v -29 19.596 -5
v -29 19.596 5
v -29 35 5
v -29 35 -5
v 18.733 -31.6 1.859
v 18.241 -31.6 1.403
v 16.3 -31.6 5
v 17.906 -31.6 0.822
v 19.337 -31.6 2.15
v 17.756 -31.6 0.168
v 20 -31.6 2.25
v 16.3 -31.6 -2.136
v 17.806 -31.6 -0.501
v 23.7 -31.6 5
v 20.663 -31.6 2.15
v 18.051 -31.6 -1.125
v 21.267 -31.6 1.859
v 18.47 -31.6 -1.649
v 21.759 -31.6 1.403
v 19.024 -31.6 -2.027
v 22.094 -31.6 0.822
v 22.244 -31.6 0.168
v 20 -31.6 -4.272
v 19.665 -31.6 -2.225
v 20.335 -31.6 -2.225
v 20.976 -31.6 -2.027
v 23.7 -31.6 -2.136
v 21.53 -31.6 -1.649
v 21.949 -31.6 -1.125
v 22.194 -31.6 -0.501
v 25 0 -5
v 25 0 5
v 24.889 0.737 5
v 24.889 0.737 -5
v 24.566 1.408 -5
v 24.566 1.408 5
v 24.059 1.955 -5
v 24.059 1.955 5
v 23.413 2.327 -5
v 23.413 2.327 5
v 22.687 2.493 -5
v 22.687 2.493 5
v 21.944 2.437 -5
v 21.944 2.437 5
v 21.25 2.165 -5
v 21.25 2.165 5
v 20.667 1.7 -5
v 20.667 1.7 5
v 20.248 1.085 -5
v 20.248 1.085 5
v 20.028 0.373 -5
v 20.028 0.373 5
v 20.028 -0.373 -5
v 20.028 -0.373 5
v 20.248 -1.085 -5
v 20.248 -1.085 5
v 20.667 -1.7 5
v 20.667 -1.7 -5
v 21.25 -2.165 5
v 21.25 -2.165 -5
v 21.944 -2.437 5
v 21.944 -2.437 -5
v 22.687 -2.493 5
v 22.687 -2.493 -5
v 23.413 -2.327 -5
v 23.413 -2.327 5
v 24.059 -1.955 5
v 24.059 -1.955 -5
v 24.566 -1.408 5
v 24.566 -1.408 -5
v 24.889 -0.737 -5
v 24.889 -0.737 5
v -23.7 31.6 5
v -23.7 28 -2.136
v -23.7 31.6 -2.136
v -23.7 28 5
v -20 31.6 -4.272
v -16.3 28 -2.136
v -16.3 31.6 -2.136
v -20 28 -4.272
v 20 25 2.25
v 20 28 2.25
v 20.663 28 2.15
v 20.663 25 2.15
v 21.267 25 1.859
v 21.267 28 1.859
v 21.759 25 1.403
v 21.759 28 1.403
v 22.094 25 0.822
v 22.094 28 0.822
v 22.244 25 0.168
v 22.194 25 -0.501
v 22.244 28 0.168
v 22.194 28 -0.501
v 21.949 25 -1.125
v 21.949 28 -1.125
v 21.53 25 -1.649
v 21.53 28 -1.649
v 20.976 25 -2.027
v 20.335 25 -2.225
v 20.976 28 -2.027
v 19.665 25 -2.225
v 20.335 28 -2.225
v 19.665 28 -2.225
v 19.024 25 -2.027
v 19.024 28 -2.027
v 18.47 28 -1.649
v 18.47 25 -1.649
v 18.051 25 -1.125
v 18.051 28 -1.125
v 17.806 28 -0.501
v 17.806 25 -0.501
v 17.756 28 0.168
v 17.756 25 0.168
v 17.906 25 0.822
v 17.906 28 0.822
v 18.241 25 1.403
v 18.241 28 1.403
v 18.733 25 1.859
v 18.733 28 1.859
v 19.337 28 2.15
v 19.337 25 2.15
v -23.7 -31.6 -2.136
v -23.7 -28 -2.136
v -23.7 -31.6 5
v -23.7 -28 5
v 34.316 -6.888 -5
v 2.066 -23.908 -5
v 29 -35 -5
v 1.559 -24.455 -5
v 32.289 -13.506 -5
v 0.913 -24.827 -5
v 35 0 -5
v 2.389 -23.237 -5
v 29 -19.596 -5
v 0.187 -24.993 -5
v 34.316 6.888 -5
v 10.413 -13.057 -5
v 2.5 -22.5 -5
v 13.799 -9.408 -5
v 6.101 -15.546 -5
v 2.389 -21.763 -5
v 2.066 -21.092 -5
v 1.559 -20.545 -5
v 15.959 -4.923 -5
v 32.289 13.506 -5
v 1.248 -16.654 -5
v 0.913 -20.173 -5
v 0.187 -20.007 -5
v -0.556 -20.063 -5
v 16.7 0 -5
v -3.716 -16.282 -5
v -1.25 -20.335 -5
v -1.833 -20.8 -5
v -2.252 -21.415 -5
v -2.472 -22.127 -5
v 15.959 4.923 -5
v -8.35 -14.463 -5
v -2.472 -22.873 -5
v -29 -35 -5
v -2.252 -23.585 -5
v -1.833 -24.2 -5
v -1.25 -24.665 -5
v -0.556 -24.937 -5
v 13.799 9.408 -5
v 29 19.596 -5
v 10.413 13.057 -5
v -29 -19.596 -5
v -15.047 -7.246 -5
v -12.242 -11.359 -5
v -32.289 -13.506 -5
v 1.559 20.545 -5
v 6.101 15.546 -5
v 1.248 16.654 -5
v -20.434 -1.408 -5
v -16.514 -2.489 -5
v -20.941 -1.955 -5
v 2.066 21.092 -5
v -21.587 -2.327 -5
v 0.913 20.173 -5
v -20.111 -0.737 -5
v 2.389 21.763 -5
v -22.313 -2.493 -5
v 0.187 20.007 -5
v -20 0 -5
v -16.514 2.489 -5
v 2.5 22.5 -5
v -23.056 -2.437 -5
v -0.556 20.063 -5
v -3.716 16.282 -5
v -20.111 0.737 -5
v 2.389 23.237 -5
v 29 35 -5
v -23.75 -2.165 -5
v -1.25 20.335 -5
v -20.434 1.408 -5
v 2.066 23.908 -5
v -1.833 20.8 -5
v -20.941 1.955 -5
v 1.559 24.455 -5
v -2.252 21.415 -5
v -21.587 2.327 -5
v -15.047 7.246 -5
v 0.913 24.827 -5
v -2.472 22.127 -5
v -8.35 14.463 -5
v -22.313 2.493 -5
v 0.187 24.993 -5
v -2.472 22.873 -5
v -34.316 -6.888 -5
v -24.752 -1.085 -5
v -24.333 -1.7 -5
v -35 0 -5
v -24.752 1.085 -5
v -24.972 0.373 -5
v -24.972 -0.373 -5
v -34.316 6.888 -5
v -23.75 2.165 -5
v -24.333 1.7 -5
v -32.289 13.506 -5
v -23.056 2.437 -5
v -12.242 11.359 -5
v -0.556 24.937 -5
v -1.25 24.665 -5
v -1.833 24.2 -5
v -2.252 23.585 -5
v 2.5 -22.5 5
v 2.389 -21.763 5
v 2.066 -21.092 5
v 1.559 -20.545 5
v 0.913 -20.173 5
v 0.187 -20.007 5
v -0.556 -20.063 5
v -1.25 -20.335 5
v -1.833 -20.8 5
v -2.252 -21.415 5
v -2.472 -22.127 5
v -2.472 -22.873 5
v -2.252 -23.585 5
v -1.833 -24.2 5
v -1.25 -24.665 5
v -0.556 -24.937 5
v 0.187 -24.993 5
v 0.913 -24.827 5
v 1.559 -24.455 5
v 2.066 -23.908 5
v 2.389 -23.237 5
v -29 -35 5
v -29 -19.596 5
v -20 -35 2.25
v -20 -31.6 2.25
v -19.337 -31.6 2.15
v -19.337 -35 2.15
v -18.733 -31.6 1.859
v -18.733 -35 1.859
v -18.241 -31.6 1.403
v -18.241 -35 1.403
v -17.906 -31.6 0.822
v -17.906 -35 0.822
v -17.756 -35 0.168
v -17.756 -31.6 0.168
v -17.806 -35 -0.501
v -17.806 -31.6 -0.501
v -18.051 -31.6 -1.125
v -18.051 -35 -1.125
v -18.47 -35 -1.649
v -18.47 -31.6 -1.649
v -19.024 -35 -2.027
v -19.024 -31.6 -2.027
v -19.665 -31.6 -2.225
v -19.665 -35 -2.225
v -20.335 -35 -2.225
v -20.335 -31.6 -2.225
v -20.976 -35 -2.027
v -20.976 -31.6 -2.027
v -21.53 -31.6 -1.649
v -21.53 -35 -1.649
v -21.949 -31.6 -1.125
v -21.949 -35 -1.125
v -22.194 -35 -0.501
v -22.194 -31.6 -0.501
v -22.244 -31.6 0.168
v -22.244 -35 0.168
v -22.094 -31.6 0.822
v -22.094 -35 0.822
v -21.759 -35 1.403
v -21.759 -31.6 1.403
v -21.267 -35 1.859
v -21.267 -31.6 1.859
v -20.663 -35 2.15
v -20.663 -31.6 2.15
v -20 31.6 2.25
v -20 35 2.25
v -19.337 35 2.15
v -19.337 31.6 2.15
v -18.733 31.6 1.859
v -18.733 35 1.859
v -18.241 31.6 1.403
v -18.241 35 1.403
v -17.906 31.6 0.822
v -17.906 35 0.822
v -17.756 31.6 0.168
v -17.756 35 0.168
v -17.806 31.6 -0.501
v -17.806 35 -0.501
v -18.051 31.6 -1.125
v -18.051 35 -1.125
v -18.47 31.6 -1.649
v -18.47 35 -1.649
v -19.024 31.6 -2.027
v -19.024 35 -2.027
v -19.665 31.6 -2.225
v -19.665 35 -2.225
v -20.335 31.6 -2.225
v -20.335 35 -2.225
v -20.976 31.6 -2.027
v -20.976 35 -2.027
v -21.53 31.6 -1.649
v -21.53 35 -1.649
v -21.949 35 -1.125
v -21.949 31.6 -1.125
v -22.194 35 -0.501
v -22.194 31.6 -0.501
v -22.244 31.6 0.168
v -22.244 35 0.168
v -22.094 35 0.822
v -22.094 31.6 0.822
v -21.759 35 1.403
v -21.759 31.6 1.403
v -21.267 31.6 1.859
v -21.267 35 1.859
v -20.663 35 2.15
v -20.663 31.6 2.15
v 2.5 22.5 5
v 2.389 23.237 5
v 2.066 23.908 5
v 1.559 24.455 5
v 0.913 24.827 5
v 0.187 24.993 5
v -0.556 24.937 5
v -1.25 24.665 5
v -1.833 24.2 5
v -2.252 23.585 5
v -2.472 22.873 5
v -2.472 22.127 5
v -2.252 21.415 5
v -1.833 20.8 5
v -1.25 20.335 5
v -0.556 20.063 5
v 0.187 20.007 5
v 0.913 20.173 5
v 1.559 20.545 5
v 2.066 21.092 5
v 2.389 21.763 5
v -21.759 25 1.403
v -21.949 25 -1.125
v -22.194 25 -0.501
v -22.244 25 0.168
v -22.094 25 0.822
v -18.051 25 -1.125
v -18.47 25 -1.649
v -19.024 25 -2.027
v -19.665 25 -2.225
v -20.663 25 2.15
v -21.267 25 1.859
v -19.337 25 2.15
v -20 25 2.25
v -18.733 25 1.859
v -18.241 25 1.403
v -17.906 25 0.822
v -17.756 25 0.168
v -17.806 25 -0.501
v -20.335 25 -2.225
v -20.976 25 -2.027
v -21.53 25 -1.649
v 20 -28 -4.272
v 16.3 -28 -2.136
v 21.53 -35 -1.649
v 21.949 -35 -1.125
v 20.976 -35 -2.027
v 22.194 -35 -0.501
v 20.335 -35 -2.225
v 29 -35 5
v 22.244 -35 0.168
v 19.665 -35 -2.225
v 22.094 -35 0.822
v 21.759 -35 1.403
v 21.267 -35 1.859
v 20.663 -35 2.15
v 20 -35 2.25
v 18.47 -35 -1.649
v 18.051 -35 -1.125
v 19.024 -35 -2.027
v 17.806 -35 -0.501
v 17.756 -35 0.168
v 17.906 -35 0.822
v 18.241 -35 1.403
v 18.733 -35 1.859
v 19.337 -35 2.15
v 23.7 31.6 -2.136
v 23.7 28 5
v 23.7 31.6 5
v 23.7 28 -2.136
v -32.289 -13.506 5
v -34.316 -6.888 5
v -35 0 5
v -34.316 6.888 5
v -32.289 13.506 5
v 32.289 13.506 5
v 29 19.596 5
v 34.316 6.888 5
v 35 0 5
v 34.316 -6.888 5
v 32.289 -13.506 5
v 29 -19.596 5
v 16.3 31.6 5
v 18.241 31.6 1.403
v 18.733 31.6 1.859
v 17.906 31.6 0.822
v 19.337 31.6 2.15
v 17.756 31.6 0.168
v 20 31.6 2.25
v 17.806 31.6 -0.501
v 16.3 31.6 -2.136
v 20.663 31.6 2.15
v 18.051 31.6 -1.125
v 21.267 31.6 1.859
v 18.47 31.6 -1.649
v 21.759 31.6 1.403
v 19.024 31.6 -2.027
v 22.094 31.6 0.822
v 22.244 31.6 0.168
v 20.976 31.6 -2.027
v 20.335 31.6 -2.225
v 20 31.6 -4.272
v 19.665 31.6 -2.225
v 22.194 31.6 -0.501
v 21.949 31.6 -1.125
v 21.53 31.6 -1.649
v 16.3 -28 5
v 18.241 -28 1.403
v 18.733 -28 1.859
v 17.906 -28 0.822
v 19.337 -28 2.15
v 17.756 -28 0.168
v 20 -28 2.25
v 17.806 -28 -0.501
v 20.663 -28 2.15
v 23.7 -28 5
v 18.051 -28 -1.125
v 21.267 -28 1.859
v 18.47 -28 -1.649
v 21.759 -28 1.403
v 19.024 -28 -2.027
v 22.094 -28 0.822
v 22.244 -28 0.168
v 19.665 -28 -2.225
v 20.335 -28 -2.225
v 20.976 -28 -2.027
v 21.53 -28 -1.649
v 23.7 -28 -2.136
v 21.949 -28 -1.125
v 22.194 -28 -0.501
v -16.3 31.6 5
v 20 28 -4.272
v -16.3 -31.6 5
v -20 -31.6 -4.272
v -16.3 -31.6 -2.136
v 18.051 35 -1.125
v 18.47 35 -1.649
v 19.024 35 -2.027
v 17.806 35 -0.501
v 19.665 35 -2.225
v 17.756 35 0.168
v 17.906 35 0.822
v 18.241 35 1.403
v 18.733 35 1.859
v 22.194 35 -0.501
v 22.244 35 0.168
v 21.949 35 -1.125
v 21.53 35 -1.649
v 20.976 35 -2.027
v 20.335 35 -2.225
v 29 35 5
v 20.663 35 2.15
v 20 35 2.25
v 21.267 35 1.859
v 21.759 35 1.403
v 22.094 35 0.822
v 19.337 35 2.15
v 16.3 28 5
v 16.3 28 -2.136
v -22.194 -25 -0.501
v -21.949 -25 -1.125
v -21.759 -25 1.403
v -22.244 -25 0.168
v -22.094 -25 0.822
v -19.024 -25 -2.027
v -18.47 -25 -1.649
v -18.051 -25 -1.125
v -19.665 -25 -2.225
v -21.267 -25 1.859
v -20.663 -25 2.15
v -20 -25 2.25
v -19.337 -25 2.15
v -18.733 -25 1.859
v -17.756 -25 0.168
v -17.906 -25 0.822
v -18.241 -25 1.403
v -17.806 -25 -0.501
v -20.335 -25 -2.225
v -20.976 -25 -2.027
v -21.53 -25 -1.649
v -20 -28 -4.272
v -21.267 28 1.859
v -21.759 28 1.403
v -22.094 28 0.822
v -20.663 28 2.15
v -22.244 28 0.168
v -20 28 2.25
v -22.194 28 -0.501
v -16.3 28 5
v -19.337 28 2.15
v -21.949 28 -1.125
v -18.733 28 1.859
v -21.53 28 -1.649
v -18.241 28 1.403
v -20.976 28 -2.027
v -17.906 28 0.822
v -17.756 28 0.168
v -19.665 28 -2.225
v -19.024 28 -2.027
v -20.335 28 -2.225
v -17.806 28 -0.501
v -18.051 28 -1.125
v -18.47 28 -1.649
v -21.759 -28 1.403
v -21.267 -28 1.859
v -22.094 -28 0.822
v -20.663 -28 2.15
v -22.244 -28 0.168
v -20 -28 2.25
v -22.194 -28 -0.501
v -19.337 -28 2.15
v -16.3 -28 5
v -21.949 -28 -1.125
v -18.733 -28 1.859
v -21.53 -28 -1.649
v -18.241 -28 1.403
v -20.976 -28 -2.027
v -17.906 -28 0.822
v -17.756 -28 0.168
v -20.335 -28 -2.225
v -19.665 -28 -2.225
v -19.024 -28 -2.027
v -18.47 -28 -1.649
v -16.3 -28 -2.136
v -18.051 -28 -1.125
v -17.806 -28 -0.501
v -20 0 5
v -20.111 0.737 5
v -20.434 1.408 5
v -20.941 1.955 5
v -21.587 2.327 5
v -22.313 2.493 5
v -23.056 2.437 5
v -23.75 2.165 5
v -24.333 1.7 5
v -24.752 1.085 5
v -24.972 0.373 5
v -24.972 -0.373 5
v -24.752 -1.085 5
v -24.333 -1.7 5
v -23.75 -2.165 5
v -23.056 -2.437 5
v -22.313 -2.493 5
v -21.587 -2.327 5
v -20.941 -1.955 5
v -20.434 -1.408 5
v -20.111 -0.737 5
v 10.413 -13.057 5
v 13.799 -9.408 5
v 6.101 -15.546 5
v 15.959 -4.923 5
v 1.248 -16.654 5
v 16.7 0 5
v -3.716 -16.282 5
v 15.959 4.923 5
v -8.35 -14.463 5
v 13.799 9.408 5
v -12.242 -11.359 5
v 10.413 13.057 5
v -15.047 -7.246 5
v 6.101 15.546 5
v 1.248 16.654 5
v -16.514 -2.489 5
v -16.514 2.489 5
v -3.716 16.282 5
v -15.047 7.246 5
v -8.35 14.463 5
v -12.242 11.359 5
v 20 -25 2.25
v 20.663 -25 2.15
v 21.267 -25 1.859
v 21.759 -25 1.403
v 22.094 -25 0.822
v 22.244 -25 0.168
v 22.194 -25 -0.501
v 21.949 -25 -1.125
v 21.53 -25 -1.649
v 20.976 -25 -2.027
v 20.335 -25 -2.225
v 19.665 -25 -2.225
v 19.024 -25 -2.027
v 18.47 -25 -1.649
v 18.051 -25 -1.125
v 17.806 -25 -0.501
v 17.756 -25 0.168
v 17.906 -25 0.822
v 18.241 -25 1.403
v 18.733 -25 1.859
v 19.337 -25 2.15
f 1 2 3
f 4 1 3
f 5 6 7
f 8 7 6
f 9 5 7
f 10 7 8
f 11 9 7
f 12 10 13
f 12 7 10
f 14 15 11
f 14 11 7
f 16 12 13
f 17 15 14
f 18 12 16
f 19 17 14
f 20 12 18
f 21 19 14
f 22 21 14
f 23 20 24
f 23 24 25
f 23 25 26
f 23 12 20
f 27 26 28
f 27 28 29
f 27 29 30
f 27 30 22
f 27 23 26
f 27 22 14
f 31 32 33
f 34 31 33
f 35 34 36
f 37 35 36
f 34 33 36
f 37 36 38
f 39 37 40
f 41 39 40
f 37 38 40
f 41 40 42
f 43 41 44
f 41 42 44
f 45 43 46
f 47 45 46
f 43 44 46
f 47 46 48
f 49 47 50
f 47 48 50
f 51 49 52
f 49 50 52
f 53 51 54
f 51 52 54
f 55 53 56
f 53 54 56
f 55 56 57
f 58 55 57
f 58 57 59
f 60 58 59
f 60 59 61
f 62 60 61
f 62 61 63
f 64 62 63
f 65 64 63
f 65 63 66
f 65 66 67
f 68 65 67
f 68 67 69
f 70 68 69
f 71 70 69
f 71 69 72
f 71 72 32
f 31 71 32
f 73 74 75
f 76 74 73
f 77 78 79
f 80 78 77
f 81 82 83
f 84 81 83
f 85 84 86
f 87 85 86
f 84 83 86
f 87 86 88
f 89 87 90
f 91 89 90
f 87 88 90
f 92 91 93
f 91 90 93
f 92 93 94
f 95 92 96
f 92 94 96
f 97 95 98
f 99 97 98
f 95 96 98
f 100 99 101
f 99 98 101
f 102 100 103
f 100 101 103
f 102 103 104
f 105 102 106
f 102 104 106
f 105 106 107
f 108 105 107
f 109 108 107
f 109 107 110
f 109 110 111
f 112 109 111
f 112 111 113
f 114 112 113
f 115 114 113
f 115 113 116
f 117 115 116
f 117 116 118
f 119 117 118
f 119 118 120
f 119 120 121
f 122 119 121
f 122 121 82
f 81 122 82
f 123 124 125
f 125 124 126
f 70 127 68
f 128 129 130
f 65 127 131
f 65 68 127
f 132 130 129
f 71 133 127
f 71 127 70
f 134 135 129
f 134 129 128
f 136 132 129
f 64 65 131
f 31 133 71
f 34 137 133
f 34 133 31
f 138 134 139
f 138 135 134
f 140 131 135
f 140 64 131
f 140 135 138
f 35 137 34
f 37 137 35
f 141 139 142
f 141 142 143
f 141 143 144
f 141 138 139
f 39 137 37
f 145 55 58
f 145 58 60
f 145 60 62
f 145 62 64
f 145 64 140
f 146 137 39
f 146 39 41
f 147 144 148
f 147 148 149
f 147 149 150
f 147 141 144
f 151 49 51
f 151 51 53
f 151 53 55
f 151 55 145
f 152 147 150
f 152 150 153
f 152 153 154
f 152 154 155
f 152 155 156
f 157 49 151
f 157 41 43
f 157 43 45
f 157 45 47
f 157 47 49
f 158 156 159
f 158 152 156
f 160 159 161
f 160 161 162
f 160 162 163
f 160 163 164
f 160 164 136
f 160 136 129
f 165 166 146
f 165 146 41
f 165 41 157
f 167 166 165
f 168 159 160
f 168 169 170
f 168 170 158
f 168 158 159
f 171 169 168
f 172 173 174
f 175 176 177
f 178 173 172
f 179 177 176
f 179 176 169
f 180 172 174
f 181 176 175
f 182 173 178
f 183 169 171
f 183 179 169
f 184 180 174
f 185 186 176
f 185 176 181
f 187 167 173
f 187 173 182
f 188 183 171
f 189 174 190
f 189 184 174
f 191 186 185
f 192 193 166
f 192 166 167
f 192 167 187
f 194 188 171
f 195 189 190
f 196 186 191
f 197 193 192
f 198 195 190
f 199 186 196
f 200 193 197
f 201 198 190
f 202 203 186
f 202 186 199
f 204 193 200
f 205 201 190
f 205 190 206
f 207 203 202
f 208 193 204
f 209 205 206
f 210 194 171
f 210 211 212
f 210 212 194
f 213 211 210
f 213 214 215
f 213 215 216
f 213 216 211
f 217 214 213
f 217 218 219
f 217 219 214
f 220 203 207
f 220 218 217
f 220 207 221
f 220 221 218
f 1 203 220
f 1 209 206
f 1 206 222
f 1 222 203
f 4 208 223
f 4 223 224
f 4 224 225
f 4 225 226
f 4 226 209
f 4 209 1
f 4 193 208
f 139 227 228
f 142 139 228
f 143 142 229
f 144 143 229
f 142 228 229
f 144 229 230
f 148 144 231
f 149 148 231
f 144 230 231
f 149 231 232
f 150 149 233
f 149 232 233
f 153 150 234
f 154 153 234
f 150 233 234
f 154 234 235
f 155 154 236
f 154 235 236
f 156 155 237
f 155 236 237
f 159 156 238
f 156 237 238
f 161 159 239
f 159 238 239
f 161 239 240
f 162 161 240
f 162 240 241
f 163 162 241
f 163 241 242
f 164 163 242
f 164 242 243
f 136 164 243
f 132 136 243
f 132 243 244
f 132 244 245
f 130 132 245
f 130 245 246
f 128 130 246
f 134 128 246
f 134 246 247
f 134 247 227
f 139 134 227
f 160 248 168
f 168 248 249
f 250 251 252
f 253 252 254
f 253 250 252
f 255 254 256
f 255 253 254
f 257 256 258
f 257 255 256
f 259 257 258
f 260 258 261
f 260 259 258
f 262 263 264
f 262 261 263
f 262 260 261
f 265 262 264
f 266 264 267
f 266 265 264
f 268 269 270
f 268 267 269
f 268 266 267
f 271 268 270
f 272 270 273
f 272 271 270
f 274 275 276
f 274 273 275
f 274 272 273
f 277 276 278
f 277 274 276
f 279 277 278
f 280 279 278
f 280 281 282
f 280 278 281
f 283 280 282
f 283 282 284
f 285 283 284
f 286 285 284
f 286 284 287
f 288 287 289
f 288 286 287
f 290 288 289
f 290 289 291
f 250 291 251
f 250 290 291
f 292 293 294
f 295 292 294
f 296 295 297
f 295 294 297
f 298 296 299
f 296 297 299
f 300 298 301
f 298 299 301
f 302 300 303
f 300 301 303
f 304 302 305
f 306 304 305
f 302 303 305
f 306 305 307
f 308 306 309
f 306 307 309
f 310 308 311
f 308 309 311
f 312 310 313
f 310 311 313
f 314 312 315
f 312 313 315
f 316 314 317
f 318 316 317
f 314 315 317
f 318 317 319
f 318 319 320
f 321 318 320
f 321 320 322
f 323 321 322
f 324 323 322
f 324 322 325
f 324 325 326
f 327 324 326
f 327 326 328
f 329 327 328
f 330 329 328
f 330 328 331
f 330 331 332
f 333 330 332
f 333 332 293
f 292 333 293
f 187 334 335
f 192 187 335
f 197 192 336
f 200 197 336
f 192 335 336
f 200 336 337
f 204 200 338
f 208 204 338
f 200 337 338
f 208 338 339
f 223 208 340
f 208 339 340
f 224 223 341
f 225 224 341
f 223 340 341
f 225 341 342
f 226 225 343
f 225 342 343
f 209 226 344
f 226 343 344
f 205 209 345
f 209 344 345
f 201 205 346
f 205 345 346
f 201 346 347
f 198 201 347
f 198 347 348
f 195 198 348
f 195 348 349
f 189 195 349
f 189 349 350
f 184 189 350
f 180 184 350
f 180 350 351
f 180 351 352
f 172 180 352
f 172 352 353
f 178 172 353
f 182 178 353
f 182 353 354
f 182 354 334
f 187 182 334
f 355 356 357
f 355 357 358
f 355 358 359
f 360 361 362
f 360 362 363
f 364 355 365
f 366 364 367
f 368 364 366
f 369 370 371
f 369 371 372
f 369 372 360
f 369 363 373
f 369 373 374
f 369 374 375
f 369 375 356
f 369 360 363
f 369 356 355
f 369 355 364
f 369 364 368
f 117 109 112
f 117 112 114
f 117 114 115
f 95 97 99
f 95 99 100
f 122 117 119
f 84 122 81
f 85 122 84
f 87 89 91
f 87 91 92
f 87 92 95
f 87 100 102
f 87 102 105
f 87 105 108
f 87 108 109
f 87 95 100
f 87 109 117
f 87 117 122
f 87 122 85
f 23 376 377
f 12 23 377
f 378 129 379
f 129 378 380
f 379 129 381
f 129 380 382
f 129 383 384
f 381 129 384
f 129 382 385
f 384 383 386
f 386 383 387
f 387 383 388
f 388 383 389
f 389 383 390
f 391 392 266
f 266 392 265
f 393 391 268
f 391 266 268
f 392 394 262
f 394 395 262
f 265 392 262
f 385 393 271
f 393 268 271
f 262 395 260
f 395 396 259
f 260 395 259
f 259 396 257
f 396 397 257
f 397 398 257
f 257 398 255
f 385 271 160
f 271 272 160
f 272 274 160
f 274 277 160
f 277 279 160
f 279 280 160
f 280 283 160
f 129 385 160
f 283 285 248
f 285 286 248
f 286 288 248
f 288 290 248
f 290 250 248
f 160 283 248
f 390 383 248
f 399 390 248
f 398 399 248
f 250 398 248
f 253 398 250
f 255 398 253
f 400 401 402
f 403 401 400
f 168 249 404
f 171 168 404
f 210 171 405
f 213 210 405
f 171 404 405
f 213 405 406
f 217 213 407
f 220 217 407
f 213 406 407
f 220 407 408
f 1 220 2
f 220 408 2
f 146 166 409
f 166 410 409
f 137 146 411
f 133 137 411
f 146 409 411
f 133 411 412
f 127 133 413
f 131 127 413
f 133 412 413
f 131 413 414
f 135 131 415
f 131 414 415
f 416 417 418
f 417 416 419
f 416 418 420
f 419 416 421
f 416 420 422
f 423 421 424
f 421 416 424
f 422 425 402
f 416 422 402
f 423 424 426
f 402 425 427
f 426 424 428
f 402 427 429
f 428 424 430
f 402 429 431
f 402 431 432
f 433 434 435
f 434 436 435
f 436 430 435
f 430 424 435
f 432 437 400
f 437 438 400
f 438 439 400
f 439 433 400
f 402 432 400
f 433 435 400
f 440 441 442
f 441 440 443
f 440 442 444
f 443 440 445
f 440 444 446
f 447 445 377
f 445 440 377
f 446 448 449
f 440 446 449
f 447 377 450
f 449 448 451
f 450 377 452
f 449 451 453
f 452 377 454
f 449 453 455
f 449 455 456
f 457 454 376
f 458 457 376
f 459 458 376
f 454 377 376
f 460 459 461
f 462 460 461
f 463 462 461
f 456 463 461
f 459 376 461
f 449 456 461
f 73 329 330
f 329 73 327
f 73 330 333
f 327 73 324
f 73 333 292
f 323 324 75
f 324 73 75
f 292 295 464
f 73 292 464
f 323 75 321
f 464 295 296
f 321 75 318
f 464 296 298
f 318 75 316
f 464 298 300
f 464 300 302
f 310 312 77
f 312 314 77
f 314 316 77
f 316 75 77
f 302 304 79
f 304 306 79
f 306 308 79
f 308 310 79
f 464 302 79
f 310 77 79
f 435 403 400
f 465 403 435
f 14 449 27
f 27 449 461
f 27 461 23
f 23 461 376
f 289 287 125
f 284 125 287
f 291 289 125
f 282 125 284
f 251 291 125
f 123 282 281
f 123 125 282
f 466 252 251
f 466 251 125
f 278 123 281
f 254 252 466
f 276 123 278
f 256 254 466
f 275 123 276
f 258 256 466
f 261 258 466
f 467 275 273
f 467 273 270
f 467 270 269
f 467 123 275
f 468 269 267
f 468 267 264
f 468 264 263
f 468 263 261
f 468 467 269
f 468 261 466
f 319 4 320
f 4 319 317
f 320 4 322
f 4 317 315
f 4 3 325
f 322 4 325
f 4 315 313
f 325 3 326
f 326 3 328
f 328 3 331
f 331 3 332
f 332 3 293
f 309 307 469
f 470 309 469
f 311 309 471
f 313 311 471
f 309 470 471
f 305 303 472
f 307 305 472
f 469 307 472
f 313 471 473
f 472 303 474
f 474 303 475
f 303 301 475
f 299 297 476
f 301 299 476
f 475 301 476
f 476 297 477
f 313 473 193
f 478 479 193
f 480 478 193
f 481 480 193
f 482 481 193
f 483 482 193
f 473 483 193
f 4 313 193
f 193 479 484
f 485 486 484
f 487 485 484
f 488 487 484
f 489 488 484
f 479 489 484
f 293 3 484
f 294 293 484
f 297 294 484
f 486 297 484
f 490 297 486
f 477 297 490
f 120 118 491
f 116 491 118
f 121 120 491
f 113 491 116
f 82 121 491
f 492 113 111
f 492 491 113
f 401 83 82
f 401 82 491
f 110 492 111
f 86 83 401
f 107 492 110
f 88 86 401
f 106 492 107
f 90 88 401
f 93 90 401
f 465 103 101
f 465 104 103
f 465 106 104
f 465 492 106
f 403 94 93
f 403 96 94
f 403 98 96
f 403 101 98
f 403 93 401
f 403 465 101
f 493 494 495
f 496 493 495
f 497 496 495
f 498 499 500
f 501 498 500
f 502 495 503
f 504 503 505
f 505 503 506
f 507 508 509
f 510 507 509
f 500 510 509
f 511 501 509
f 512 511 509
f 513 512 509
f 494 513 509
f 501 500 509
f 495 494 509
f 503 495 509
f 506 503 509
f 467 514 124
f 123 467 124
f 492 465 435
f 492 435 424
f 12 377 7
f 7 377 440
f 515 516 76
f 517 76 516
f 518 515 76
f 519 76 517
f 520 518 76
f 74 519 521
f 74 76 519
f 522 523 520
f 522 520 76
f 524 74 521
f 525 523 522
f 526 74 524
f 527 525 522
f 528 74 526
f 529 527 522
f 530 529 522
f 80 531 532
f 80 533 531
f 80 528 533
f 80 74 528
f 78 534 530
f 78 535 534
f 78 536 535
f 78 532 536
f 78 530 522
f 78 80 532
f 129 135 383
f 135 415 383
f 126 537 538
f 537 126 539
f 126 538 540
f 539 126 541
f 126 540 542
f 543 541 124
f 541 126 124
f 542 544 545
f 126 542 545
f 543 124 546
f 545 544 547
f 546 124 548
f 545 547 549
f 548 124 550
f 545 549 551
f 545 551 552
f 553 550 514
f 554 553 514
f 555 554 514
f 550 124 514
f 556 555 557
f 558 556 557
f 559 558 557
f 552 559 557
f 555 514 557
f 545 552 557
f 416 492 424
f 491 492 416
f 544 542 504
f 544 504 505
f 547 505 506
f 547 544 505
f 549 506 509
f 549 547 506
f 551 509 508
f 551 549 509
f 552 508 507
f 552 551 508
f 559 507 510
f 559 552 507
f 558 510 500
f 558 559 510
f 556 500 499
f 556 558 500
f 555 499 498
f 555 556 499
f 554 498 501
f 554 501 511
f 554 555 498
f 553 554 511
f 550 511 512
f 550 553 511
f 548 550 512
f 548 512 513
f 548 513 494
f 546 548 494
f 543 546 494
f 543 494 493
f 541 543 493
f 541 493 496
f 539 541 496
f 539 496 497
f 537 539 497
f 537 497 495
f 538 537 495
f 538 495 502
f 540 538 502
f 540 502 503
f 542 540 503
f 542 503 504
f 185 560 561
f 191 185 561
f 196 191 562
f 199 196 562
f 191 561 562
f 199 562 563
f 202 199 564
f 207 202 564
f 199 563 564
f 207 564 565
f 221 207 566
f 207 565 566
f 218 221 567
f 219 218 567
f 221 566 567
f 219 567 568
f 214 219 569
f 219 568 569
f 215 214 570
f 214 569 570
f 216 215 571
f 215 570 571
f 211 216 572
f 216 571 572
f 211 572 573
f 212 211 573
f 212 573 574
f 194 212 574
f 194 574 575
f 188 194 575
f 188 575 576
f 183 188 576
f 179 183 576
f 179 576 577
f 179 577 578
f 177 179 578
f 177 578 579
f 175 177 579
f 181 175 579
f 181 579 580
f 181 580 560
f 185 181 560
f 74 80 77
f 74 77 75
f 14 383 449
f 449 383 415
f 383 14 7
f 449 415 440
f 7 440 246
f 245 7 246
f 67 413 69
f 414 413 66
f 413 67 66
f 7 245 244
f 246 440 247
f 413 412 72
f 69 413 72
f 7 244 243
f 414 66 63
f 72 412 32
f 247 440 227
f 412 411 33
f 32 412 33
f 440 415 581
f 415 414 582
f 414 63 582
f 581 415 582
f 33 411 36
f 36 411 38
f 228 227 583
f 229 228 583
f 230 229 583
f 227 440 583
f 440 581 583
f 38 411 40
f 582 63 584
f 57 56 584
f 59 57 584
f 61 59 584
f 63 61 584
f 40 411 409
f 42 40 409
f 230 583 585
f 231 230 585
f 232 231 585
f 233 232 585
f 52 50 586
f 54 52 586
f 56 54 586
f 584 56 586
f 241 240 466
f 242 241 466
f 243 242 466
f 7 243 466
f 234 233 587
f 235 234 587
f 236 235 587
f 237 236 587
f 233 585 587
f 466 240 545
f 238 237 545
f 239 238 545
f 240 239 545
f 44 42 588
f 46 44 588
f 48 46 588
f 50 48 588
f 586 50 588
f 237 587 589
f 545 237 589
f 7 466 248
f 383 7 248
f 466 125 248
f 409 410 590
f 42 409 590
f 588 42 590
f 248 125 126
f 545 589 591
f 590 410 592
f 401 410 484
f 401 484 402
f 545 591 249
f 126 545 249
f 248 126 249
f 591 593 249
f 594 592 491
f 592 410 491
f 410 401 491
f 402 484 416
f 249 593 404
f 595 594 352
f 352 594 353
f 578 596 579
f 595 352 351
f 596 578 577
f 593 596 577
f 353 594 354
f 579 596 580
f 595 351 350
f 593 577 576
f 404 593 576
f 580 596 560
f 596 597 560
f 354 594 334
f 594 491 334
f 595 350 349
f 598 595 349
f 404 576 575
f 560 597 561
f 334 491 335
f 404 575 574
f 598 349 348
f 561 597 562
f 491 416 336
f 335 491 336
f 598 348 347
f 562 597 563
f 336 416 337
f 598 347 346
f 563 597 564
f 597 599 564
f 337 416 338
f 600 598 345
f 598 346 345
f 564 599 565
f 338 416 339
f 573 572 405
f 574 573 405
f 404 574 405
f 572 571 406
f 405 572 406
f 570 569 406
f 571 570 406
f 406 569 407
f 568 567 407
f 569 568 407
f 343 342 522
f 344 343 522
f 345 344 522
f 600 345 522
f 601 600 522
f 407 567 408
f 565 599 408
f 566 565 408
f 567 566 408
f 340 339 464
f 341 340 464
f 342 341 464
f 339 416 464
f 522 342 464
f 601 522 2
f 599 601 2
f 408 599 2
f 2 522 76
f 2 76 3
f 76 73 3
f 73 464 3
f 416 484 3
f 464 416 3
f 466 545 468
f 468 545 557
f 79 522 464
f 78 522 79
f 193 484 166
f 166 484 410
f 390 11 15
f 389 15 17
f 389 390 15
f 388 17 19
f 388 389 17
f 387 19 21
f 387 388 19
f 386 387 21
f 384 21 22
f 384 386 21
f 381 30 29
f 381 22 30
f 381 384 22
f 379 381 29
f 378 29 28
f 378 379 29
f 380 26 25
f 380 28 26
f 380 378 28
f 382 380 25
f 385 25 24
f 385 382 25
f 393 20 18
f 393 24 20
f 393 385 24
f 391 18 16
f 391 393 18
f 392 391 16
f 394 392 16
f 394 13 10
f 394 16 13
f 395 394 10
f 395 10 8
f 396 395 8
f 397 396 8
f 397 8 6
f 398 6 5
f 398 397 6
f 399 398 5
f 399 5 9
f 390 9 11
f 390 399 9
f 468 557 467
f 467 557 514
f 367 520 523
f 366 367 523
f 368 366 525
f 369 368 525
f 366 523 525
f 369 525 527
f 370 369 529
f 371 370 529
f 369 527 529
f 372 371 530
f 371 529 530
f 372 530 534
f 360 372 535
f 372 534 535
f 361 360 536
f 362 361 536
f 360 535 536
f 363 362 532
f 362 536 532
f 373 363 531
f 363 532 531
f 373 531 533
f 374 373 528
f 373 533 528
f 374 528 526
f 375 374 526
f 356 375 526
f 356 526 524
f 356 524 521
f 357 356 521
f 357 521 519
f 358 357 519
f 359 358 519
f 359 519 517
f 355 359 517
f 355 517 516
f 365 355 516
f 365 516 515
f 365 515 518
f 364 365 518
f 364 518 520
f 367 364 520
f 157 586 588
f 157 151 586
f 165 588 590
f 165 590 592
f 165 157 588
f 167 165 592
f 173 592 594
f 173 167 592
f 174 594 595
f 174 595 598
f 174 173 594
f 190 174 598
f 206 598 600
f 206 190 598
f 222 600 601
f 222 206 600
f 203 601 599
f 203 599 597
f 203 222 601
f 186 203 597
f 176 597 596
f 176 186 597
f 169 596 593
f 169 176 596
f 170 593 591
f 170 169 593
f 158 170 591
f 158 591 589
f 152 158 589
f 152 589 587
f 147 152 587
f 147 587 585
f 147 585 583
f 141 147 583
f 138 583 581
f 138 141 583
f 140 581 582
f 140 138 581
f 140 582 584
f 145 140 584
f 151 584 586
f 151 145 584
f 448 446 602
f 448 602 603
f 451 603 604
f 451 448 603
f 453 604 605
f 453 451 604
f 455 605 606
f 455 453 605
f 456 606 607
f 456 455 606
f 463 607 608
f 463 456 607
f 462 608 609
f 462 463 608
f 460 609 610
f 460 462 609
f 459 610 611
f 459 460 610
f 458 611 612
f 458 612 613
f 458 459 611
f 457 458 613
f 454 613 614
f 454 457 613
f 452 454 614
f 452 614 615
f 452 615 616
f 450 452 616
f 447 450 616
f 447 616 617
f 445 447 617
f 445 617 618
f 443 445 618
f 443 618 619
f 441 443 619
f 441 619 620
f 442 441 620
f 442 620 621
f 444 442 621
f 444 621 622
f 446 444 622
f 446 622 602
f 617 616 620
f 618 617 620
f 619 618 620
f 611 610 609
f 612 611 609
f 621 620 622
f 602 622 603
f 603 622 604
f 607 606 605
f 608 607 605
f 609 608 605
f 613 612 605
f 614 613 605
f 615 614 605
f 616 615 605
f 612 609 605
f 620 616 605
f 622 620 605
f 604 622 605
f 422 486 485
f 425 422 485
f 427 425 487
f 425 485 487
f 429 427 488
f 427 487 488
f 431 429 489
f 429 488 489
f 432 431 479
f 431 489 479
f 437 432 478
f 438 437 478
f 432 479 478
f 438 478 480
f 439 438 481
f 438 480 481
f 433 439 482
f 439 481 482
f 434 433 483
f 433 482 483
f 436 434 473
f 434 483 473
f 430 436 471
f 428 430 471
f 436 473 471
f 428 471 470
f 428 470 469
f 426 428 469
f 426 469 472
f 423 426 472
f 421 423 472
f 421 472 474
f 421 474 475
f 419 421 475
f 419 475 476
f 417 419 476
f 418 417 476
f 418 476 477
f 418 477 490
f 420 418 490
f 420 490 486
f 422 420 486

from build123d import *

# Parameters (mm, degrees)
CROQUIS1_R              = 16.7005
SALIENTE_EXTRUIR1_DEPTH = 5
CORTAR_EXTRUIR1_DEPTH   = 3.6
CROQUIS6_R              = 2.25
CORTAR_EXTRUIR2_DEPTH   = 10
CORTAR_EXTRUIR3_REACH   = 52.498
CROQUIS7_R              = 2.5


with BuildPart() as part:
    # Croquis1 → Saliente-Extruir1 (new, symmetric)
    with BuildSketch(Plane.XY):
        with BuildLine():
            Line((-29, 19.595917942), (-29, 35))
            Line((-29, 35), (29, 35))
            Line((29, 35), (29, 19.595917942))
            ThreePointArc((29, 19.595917942), (35, 0), (29, -19.595917942))
            Line((29, -19.595917942), (29, -35))
            Line((29, -35), (-29, -35))
            Line((-29, -35), (-29, -19.595917942))
            ThreePointArc((-29, -19.595917942), (-35, 0), (-29, 19.595917942))
        make_face()
        Circle(CROQUIS1_R, mode=Mode.SUBTRACT)
    extrude(amount=SALIENTE_EXTRUIR1_DEPTH, both=True)

    # Croquis5 → Cortar-Extruir1 (cut)
    with BuildSketch(Plane(origin=(0, 28, 0), x_dir=(1, 0, 0), z_dir=(0, 1, 0))):
        Polygon((-23.7, -2.136195996), (-23.7, -5), (-16.3, -5), (-16.3, -2.136195996), (-16.3, 2.136195996), (-20, 4.272391992), (-23.7, 2.136195996), align=None)
        Polygon((16.3, 2.136195996), (16.3, -2.136195996), (16.3, -5), (23.7, -5), (23.7, -2.136195996), (23.7, 2.136195996), (20, 4.272391992), align=None)
    cortar_extruir1 = extrude(amount=CORTAR_EXTRUIR1_DEPTH, mode=Mode.SUBTRACT)

    # Croquis6 → Cortar-Extruir2 (cut)
    with BuildSketch(Plane(origin=(0, 35, 0), x_dir=(1, 0, 0), z_dir=(0, 1, 0))):
        with Locations(Location((-20, 0, 0), (0, 0, 270))):
            Circle(CROQUIS6_R)
        with Locations(Location((20, 0, 0), (0, 0, 270))):
            Circle(CROQUIS6_R)
    cortar_extruir2 = extrude(amount=-CORTAR_EXTRUIR2_DEPTH, mode=Mode.SUBTRACT)

    # Simetría1: Cortar-Extruir1, Cortar-Extruir2 across plane
    add(cortar_extruir1.mirror(Plane.ZX), mode=Mode.SUBTRACT)
    add(cortar_extruir2.mirror(Plane.ZX), mode=Mode.SUBTRACT)

    # Croquis7 → Cortar-Extruir3 (cut, up to next)
    with BuildSketch(Plane.XY.offset(5), mode=Mode.PRIVATE) as cortar_extruir3_sk1:
        with Locations((0, 22.5)):
            Circle(CROQUIS7_R)
    cortar_extruir3_tool1 = extrude(cortar_extruir3_sk1.sketch, amount=-CORTAR_EXTRUIR3_REACH, mode=Mode.PRIVATE) & part.part
    # Croquis7 → Cortar-Extruir3 (cut, up to next)
    with BuildSketch(Plane.XY.offset(5), mode=Mode.PRIVATE) as cortar_extruir3_sk2:
        with Locations((22.5, 0)):
            Circle(CROQUIS7_R)
    cortar_extruir3_tool2 = extrude(cortar_extruir3_sk2.sketch, amount=-CORTAR_EXTRUIR3_REACH, mode=Mode.PRIVATE) & part.part
    # Croquis7 → Cortar-Extruir3 (cut, up to next)
    with BuildSketch(Plane.XY.offset(5), mode=Mode.PRIVATE) as cortar_extruir3_sk3:
        with Locations((0, -22.5)):
            Circle(CROQUIS7_R)
    cortar_extruir3_tool3 = extrude(cortar_extruir3_sk3.sketch, amount=-CORTAR_EXTRUIR3_REACH, mode=Mode.PRIVATE) & part.part
    # Croquis7 → Cortar-Extruir3 (cut, up to next)
    with BuildSketch(Plane.XY.offset(5), mode=Mode.PRIVATE) as cortar_extruir3_sk4:
        with Locations((-22.5, 0)):
            Circle(CROQUIS7_R)
    cortar_extruir3_tool4 = extrude(cortar_extruir3_sk4.sketch, amount=-CORTAR_EXTRUIR3_REACH, mode=Mode.PRIVATE) & part.part
    add(cortar_extruir3_tool1.solids().sort_by_distance((0, 22.5, 5))[0], mode=Mode.SUBTRACT)
    add(cortar_extruir3_tool2.solids().sort_by_distance((22.5, 0, 5))[0], mode=Mode.SUBTRACT)
    add(cortar_extruir3_tool3.solids().sort_by_distance((0, -22.5, 5))[0], mode=Mode.SUBTRACT)
    add(cortar_extruir3_tool4.solids().sort_by_distance((-22.5, 0, 5))[0], mode=Mode.SUBTRACT)


solid = part.part
